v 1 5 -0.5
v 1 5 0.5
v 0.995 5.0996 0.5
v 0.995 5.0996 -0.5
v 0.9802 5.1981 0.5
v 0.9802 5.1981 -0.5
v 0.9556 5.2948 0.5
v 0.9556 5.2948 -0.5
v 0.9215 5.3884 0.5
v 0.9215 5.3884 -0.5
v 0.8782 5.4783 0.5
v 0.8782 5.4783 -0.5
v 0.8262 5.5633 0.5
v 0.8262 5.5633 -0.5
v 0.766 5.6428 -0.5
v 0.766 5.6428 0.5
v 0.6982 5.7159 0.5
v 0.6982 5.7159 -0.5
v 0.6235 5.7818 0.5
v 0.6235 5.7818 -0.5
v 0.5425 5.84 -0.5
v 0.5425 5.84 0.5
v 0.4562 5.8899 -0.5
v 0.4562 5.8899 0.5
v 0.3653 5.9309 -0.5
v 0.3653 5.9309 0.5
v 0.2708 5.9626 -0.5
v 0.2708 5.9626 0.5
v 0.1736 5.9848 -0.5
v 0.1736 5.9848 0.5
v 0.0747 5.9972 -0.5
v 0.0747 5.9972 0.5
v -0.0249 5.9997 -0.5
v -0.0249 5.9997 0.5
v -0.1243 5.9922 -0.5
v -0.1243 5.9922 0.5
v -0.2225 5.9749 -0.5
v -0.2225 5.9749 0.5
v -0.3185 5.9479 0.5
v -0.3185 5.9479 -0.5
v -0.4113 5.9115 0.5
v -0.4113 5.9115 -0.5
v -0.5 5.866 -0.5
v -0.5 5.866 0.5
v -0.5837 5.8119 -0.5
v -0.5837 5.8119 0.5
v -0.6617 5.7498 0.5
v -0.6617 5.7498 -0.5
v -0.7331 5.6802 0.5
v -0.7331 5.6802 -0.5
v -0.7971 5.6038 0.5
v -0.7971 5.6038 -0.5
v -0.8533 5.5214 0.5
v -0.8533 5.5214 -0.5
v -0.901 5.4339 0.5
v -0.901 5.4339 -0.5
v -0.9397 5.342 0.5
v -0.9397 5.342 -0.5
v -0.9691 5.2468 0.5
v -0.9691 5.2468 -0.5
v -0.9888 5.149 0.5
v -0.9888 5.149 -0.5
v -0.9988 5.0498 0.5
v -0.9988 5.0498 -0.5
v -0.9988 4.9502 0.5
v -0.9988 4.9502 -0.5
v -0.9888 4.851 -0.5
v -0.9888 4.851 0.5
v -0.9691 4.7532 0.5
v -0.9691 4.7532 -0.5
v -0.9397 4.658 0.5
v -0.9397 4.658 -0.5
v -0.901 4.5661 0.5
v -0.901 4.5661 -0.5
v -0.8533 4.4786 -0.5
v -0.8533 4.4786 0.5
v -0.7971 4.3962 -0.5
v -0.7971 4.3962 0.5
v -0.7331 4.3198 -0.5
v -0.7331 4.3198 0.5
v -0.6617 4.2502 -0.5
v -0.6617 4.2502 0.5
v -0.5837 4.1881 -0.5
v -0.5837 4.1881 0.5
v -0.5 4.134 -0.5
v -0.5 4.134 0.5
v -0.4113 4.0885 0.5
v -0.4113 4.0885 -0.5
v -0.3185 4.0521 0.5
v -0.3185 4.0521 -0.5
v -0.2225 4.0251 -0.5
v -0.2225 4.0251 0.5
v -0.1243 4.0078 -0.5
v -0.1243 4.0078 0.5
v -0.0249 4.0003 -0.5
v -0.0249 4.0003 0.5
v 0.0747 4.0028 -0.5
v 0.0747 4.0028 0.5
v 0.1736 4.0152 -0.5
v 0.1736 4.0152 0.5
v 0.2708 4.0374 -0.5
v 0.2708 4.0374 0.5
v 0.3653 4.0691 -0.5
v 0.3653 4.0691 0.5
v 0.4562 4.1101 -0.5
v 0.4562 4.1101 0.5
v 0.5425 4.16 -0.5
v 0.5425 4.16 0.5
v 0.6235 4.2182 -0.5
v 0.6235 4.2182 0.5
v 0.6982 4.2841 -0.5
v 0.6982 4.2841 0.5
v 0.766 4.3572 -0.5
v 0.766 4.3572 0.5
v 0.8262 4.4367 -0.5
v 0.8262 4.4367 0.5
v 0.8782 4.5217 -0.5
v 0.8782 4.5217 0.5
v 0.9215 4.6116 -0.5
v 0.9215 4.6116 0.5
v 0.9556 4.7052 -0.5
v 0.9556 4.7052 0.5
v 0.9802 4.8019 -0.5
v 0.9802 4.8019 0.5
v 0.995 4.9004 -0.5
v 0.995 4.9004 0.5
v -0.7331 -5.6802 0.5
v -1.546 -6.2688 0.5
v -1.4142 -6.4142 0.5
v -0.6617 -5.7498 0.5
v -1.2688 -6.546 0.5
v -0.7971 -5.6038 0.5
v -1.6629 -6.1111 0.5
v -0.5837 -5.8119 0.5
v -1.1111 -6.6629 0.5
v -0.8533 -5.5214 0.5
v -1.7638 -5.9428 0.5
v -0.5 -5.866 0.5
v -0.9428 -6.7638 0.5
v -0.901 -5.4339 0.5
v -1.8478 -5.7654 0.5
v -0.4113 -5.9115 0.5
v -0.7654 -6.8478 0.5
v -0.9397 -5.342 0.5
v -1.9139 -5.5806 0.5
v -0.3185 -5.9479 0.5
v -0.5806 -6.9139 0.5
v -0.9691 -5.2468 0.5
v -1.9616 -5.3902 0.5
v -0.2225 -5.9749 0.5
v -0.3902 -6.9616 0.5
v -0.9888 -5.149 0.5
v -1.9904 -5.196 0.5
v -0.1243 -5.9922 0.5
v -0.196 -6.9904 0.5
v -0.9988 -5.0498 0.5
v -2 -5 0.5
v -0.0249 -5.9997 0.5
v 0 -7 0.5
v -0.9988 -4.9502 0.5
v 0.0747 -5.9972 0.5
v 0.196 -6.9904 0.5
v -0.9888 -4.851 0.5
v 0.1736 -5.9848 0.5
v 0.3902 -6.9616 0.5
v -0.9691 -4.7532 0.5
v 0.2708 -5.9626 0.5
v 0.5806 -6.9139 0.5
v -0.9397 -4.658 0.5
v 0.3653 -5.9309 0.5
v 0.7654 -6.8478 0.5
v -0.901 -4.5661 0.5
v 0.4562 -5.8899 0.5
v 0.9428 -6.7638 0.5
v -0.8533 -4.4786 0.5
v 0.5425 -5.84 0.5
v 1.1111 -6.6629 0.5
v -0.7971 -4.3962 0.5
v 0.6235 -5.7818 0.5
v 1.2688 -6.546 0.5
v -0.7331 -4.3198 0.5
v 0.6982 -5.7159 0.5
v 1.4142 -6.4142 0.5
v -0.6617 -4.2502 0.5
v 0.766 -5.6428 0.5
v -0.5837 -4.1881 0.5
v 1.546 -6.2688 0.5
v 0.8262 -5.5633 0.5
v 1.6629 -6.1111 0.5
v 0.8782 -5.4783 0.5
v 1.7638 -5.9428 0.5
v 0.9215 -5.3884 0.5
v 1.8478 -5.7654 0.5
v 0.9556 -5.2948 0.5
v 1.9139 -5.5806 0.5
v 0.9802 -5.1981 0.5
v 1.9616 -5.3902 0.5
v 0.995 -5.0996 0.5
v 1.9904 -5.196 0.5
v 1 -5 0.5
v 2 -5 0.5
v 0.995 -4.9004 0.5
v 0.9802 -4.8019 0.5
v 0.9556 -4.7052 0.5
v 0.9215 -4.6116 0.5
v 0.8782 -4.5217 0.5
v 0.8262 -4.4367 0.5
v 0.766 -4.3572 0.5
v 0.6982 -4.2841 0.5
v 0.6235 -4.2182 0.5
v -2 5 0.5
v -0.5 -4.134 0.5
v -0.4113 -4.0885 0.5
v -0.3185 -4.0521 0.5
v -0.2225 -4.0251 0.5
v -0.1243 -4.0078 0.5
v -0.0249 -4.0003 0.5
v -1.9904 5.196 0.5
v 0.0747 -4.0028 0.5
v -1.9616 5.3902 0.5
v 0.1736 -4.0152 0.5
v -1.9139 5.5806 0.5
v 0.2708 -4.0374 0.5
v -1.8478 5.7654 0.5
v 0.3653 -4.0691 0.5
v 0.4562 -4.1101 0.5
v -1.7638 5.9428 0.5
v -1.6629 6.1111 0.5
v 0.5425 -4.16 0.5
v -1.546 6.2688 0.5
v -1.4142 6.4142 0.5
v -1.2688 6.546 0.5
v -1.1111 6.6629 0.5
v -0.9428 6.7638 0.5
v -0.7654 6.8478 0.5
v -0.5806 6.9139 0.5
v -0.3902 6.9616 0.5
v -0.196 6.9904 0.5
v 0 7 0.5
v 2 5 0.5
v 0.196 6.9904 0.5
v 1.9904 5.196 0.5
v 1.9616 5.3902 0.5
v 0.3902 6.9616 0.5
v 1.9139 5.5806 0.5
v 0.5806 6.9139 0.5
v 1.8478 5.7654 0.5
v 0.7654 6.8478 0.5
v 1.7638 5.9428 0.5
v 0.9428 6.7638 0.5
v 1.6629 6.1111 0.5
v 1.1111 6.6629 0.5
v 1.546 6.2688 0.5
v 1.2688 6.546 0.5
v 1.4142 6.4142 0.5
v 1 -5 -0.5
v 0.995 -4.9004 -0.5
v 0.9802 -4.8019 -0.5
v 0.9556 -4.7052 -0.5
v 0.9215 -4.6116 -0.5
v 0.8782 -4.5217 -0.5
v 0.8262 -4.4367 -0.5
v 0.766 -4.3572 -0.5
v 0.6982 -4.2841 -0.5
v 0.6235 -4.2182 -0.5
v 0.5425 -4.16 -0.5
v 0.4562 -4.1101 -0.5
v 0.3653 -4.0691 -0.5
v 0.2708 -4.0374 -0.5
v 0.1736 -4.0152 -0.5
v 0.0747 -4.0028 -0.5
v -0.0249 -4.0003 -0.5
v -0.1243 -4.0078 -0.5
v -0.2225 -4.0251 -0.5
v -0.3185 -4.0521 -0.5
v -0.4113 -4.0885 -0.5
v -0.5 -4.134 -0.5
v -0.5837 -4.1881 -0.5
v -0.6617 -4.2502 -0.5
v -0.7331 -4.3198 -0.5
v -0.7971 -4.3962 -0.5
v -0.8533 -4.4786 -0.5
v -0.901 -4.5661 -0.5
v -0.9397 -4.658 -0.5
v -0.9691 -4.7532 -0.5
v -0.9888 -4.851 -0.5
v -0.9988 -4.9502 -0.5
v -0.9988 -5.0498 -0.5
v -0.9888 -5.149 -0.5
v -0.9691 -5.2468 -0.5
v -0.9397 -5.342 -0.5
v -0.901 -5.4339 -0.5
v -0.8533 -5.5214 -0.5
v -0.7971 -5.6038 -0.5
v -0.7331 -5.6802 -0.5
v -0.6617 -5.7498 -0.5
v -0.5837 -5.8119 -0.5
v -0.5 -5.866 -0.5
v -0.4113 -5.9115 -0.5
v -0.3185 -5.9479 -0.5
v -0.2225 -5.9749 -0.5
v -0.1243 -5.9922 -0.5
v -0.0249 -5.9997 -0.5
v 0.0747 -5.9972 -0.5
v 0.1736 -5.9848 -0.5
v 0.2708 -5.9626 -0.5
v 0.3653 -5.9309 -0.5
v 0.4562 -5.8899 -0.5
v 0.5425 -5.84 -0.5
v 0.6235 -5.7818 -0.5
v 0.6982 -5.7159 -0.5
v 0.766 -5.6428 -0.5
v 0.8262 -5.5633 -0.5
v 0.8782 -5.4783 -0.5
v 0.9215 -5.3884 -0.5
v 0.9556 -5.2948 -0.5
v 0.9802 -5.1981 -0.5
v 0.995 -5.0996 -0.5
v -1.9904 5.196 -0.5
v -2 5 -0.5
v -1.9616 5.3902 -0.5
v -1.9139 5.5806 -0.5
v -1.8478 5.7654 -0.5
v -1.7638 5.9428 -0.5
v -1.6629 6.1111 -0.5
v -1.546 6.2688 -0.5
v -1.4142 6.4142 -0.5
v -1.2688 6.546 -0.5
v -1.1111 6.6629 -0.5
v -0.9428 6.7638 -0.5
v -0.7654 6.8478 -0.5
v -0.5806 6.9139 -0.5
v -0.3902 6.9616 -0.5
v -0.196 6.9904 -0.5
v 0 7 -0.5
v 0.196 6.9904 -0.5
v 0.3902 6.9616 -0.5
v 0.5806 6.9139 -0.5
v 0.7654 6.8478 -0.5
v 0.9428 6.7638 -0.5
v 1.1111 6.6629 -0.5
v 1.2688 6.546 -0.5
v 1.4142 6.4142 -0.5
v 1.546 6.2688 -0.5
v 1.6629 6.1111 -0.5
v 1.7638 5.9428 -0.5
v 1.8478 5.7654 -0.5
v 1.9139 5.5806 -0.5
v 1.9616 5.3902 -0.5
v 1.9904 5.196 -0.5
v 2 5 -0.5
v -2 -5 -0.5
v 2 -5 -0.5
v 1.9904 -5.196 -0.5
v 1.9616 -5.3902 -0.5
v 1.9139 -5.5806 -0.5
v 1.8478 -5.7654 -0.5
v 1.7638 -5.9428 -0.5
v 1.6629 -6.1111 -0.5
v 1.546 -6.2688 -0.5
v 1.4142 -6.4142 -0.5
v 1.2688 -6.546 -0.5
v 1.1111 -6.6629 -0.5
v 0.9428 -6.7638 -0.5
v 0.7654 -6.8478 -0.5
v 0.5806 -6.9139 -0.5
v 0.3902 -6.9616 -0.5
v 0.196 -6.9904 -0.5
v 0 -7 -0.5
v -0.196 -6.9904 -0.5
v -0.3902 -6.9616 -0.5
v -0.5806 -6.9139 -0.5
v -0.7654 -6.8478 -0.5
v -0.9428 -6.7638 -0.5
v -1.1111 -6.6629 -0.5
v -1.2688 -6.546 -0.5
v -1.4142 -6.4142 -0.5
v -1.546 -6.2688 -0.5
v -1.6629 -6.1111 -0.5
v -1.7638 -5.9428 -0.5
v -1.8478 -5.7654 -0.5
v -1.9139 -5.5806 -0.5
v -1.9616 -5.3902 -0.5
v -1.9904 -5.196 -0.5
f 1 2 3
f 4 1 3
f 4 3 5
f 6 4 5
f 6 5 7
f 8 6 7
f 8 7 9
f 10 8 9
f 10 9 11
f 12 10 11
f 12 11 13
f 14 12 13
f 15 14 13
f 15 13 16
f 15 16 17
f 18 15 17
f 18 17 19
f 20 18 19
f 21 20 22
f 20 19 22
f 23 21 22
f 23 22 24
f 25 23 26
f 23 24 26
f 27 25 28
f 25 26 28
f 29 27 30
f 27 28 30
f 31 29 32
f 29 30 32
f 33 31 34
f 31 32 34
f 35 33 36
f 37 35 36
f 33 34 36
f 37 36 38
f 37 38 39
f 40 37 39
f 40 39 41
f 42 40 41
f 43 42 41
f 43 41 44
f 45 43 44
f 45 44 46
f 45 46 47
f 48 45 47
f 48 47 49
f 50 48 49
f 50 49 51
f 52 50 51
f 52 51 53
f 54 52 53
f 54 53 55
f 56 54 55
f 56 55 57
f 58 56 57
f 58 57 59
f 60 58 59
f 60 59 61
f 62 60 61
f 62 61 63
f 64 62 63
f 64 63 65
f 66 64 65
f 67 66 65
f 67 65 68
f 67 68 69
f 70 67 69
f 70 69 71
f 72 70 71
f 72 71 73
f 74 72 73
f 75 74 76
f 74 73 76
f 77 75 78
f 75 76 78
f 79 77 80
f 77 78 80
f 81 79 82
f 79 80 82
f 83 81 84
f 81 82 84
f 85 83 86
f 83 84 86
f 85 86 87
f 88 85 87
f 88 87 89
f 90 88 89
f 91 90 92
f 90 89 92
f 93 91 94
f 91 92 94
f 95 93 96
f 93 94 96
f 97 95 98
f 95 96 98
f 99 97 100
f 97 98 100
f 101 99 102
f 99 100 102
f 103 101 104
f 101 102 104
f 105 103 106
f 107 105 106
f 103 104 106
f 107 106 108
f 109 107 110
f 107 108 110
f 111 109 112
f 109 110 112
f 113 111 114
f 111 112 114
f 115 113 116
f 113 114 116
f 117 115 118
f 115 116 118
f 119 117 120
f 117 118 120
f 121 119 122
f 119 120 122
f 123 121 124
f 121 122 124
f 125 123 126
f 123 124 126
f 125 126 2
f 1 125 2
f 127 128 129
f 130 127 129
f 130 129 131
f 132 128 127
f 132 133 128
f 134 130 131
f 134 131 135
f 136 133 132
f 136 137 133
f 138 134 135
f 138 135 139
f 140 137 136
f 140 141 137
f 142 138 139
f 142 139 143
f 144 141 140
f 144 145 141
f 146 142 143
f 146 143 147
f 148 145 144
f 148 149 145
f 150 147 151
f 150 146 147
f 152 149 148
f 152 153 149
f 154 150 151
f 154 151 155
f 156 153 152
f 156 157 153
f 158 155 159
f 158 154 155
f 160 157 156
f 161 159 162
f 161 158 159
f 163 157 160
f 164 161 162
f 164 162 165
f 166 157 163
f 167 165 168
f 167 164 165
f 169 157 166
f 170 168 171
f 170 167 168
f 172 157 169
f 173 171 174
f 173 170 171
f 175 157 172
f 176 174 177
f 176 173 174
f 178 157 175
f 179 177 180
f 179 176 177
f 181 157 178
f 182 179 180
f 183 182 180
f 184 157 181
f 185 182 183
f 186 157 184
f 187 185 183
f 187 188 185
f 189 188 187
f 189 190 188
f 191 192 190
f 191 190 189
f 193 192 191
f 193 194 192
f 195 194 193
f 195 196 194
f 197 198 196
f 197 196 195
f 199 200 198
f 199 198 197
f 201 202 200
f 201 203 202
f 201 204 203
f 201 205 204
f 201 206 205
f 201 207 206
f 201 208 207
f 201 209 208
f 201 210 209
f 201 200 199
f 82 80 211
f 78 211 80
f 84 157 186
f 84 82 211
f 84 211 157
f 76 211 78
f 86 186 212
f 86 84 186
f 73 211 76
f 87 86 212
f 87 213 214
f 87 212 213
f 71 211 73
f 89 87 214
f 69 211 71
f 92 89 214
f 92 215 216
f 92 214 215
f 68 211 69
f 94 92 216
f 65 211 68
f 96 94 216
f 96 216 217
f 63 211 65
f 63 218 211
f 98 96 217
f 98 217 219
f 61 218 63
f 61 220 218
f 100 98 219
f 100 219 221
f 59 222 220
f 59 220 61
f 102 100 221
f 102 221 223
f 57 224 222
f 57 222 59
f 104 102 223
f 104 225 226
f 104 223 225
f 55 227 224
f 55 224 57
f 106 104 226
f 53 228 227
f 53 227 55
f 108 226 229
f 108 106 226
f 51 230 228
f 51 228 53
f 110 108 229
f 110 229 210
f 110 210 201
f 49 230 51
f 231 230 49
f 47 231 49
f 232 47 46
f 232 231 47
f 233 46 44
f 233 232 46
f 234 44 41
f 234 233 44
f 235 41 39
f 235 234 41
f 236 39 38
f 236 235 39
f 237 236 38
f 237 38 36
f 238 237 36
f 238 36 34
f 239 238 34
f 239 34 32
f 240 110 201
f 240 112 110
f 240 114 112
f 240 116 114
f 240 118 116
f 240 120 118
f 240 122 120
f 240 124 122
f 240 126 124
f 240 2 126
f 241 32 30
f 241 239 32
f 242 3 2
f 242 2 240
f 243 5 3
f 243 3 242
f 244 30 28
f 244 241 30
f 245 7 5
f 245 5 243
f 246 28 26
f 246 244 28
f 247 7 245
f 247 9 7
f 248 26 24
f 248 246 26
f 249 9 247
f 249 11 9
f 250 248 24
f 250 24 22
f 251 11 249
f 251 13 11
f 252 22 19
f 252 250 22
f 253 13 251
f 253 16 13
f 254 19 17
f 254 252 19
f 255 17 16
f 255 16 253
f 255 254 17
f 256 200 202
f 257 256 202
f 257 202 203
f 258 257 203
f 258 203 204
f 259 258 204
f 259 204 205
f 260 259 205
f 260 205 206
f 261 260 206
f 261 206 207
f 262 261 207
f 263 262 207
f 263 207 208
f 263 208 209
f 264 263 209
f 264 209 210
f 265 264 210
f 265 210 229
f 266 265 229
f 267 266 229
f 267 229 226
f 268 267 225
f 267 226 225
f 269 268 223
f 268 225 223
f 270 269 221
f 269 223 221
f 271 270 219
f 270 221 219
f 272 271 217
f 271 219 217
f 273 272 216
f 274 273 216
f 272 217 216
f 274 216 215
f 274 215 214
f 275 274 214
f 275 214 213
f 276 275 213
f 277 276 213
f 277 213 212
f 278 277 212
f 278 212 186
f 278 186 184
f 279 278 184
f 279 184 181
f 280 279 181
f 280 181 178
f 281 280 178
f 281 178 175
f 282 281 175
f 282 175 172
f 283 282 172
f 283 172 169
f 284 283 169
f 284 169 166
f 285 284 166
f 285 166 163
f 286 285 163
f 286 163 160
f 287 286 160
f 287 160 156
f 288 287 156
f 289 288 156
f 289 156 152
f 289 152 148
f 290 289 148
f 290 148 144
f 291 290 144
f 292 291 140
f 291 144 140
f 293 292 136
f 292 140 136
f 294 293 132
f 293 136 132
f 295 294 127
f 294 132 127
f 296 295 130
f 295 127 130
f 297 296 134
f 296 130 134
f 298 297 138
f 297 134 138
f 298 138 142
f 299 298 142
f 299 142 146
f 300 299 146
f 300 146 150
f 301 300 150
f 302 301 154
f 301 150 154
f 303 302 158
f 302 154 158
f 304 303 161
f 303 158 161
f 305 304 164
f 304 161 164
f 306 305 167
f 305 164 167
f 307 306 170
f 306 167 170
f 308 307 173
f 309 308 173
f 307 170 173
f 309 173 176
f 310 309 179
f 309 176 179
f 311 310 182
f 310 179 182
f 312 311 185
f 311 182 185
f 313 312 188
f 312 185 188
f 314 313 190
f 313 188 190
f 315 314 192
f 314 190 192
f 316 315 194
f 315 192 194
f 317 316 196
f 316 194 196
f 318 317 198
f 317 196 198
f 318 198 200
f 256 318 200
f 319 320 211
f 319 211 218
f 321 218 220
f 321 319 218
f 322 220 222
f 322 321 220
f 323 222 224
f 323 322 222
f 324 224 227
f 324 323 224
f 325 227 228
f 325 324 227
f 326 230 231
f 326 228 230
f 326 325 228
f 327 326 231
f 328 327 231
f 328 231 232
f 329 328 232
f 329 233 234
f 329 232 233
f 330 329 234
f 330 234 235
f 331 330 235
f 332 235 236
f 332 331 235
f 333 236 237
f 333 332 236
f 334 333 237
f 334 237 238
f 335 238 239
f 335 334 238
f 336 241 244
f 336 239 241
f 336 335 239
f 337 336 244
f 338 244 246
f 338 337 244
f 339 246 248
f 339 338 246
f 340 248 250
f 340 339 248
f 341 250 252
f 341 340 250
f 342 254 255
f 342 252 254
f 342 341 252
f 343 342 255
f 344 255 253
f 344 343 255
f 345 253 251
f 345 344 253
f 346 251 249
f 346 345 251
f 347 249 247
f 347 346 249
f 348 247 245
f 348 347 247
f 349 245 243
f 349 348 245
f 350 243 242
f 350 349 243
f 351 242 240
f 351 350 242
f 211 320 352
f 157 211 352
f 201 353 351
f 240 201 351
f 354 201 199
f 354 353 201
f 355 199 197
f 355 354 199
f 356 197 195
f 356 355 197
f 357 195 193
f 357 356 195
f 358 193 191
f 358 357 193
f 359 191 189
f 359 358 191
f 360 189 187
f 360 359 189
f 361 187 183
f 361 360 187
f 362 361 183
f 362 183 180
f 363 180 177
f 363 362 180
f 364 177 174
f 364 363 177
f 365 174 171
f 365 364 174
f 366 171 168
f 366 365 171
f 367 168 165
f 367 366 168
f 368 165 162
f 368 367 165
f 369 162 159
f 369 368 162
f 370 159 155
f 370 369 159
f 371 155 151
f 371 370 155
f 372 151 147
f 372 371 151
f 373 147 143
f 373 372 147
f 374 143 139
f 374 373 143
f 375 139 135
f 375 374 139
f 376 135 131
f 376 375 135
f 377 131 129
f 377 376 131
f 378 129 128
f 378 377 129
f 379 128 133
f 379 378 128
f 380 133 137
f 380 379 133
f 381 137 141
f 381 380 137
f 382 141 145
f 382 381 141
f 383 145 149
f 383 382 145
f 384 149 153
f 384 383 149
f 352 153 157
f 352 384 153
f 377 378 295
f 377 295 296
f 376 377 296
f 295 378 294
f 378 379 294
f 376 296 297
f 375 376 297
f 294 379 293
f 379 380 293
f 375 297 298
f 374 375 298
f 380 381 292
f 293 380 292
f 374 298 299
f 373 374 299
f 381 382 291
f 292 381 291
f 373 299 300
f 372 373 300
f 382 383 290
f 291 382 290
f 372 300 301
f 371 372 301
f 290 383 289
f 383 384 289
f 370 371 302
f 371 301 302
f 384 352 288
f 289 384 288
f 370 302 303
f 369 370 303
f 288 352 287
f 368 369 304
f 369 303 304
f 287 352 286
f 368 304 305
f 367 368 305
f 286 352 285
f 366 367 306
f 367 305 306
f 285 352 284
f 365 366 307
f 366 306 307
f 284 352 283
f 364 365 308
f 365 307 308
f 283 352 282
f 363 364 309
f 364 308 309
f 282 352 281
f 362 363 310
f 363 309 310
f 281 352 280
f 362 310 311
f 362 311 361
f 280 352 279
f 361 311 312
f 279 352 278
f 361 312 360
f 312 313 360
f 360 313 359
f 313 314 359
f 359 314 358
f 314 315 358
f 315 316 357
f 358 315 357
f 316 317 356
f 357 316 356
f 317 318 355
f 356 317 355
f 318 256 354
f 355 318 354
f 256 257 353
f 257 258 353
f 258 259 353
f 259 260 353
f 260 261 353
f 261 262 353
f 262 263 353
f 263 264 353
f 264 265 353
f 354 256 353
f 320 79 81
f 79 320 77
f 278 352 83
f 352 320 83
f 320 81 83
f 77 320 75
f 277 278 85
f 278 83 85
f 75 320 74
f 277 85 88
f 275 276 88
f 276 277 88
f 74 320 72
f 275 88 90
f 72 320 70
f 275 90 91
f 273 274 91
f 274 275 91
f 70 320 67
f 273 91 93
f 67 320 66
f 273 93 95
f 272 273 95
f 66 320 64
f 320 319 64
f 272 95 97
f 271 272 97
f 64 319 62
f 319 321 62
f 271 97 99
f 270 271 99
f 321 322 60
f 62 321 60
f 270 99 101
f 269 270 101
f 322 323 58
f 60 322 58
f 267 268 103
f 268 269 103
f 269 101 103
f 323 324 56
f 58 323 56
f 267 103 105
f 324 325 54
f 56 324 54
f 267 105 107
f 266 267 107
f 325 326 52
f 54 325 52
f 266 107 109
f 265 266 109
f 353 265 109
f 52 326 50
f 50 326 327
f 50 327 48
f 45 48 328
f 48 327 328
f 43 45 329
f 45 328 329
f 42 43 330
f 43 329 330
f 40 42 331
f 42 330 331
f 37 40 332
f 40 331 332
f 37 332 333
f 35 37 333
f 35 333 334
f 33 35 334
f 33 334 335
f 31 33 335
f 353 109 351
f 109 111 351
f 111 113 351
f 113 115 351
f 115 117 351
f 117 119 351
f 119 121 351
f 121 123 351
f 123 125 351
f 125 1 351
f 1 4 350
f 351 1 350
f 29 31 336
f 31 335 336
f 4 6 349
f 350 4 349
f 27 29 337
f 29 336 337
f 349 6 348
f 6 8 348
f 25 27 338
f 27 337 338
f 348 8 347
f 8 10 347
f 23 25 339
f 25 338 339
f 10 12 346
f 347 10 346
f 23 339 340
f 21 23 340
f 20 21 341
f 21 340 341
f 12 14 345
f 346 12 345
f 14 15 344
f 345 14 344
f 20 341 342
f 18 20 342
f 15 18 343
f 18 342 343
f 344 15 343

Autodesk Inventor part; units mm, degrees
ref_plane "YZ Plane" through (0, 0, 0) normal (1, 0, 0) x (0, 1, 0)
ref_plane "XZ Plane" through (0, 0, 0) normal (0, 1, 0) x (-1, 0, 0)
ref_plane "XY Plane" through (0, 0, 0) normal (0, 0, 1) x (1, 0, 0)
sketch "草圖1" plane through (0, 0, 0) normal (0, 0, 1) x (1, 0, 0)
  line L0 (0, -5) -> (0, 5) construction
  line L1 (2, -5) -> (2, 5)
  line L2 (-2, 5) -> (-2, -5)
  arc A0 (-2, -5) -> (2, -5) centre (0, -5) ccw
  arc A1 (2, 5) -> (-2, 5) centre (0, 5) ccw
  point P0 (0, 0)
  dimension "d0" = 10
  dimension "d21" = 4
extrude "擠出1" add sketch "草圖1" along normal mid plane 1
sketch "草圖2" plane through (0, 0, 0) normal (0, 0, 1) x (1, 0, 0)
  arc A0 (-2, -5) -> (2, -5) centre (0, -5) ccw projected
  circle A1 centre (0, -5) radius 0.75
  point P0 (0, 0)
  dimension "d3" = 1.5
extrude "擠出2" add sketch "草圖2" along normal mid plane 3
sketch "草圖3" plane through (0, 0, 0) normal (0, 0, 1) x (1, 0, 0)
  arc A0 (2, 5) -> (-2, 5) centre (0, 5) ccw projected
  circle A1 centre (0, 5) radius 0.75
  point P0 (0, 0)
  dimension "d6" = 1.5
extrude "擠出3" add sketch "草圖3" along normal mid plane 3
sketch "草圖4" plane through (2, -5, 0.5) normal (1, 0, 0) x (0, 0, -1)
  line L0 (0, 0) -> (0, -2) projected
  line L1 (0, -2) -> (-2.346, -2)
  line L2 (-2.346, -2) -> (-2.346, 2.4059)
  line L3 (-2.346, 2.4059) -> (0, 2.4059)
  line L4 (0, 2.4059) -> (0, -2)
  point P0 (0.5, 5)
extrude "擠出4" cut sketch "草圖4" against normal blind 10
sketch "草圖5" plane through (0, 0, -0.5) normal (0, 0, -1) x (-1, 0, 0)
  circle A0 centre (0, 5) radius 0.75 projected
  point P0 (0, 0)
extrude "擠出5" cut sketch "草圖5" along normal blind 10
sketch "草圖7" plane through (0, 5, 1.5) normal (0, 0, 1) x (1, 0, 0)
  circle A0 centre (0, 0) radius 0.75
  circle A1 centre (0, 0) radius 0.75 projected
  circle A2 centre (0, -10) radius 0.75 projected
  point P0 (0, -5)
extrude "擠出7" cut sketch "草圖7" against normal blind 10
sketch "草圖8" plane through (0, 0, 0.5) normal (0, 0, 1) x (1, 0, 0)
  circle A0 centre (0, 5) radius 0.75 projected
  circle A1 centre (0, 5) radius 1
  circle A2 centre (0, -5) radius 0.75 projected
  circle A3 centre (0, -5) radius 1
  point P0 (0, 0)
  dimension "d17" = 2
  dimension "d18" = 2
extrude "擠出8" cut sketch "草圖8" against normal blind 10
properties part number "圓盤"
